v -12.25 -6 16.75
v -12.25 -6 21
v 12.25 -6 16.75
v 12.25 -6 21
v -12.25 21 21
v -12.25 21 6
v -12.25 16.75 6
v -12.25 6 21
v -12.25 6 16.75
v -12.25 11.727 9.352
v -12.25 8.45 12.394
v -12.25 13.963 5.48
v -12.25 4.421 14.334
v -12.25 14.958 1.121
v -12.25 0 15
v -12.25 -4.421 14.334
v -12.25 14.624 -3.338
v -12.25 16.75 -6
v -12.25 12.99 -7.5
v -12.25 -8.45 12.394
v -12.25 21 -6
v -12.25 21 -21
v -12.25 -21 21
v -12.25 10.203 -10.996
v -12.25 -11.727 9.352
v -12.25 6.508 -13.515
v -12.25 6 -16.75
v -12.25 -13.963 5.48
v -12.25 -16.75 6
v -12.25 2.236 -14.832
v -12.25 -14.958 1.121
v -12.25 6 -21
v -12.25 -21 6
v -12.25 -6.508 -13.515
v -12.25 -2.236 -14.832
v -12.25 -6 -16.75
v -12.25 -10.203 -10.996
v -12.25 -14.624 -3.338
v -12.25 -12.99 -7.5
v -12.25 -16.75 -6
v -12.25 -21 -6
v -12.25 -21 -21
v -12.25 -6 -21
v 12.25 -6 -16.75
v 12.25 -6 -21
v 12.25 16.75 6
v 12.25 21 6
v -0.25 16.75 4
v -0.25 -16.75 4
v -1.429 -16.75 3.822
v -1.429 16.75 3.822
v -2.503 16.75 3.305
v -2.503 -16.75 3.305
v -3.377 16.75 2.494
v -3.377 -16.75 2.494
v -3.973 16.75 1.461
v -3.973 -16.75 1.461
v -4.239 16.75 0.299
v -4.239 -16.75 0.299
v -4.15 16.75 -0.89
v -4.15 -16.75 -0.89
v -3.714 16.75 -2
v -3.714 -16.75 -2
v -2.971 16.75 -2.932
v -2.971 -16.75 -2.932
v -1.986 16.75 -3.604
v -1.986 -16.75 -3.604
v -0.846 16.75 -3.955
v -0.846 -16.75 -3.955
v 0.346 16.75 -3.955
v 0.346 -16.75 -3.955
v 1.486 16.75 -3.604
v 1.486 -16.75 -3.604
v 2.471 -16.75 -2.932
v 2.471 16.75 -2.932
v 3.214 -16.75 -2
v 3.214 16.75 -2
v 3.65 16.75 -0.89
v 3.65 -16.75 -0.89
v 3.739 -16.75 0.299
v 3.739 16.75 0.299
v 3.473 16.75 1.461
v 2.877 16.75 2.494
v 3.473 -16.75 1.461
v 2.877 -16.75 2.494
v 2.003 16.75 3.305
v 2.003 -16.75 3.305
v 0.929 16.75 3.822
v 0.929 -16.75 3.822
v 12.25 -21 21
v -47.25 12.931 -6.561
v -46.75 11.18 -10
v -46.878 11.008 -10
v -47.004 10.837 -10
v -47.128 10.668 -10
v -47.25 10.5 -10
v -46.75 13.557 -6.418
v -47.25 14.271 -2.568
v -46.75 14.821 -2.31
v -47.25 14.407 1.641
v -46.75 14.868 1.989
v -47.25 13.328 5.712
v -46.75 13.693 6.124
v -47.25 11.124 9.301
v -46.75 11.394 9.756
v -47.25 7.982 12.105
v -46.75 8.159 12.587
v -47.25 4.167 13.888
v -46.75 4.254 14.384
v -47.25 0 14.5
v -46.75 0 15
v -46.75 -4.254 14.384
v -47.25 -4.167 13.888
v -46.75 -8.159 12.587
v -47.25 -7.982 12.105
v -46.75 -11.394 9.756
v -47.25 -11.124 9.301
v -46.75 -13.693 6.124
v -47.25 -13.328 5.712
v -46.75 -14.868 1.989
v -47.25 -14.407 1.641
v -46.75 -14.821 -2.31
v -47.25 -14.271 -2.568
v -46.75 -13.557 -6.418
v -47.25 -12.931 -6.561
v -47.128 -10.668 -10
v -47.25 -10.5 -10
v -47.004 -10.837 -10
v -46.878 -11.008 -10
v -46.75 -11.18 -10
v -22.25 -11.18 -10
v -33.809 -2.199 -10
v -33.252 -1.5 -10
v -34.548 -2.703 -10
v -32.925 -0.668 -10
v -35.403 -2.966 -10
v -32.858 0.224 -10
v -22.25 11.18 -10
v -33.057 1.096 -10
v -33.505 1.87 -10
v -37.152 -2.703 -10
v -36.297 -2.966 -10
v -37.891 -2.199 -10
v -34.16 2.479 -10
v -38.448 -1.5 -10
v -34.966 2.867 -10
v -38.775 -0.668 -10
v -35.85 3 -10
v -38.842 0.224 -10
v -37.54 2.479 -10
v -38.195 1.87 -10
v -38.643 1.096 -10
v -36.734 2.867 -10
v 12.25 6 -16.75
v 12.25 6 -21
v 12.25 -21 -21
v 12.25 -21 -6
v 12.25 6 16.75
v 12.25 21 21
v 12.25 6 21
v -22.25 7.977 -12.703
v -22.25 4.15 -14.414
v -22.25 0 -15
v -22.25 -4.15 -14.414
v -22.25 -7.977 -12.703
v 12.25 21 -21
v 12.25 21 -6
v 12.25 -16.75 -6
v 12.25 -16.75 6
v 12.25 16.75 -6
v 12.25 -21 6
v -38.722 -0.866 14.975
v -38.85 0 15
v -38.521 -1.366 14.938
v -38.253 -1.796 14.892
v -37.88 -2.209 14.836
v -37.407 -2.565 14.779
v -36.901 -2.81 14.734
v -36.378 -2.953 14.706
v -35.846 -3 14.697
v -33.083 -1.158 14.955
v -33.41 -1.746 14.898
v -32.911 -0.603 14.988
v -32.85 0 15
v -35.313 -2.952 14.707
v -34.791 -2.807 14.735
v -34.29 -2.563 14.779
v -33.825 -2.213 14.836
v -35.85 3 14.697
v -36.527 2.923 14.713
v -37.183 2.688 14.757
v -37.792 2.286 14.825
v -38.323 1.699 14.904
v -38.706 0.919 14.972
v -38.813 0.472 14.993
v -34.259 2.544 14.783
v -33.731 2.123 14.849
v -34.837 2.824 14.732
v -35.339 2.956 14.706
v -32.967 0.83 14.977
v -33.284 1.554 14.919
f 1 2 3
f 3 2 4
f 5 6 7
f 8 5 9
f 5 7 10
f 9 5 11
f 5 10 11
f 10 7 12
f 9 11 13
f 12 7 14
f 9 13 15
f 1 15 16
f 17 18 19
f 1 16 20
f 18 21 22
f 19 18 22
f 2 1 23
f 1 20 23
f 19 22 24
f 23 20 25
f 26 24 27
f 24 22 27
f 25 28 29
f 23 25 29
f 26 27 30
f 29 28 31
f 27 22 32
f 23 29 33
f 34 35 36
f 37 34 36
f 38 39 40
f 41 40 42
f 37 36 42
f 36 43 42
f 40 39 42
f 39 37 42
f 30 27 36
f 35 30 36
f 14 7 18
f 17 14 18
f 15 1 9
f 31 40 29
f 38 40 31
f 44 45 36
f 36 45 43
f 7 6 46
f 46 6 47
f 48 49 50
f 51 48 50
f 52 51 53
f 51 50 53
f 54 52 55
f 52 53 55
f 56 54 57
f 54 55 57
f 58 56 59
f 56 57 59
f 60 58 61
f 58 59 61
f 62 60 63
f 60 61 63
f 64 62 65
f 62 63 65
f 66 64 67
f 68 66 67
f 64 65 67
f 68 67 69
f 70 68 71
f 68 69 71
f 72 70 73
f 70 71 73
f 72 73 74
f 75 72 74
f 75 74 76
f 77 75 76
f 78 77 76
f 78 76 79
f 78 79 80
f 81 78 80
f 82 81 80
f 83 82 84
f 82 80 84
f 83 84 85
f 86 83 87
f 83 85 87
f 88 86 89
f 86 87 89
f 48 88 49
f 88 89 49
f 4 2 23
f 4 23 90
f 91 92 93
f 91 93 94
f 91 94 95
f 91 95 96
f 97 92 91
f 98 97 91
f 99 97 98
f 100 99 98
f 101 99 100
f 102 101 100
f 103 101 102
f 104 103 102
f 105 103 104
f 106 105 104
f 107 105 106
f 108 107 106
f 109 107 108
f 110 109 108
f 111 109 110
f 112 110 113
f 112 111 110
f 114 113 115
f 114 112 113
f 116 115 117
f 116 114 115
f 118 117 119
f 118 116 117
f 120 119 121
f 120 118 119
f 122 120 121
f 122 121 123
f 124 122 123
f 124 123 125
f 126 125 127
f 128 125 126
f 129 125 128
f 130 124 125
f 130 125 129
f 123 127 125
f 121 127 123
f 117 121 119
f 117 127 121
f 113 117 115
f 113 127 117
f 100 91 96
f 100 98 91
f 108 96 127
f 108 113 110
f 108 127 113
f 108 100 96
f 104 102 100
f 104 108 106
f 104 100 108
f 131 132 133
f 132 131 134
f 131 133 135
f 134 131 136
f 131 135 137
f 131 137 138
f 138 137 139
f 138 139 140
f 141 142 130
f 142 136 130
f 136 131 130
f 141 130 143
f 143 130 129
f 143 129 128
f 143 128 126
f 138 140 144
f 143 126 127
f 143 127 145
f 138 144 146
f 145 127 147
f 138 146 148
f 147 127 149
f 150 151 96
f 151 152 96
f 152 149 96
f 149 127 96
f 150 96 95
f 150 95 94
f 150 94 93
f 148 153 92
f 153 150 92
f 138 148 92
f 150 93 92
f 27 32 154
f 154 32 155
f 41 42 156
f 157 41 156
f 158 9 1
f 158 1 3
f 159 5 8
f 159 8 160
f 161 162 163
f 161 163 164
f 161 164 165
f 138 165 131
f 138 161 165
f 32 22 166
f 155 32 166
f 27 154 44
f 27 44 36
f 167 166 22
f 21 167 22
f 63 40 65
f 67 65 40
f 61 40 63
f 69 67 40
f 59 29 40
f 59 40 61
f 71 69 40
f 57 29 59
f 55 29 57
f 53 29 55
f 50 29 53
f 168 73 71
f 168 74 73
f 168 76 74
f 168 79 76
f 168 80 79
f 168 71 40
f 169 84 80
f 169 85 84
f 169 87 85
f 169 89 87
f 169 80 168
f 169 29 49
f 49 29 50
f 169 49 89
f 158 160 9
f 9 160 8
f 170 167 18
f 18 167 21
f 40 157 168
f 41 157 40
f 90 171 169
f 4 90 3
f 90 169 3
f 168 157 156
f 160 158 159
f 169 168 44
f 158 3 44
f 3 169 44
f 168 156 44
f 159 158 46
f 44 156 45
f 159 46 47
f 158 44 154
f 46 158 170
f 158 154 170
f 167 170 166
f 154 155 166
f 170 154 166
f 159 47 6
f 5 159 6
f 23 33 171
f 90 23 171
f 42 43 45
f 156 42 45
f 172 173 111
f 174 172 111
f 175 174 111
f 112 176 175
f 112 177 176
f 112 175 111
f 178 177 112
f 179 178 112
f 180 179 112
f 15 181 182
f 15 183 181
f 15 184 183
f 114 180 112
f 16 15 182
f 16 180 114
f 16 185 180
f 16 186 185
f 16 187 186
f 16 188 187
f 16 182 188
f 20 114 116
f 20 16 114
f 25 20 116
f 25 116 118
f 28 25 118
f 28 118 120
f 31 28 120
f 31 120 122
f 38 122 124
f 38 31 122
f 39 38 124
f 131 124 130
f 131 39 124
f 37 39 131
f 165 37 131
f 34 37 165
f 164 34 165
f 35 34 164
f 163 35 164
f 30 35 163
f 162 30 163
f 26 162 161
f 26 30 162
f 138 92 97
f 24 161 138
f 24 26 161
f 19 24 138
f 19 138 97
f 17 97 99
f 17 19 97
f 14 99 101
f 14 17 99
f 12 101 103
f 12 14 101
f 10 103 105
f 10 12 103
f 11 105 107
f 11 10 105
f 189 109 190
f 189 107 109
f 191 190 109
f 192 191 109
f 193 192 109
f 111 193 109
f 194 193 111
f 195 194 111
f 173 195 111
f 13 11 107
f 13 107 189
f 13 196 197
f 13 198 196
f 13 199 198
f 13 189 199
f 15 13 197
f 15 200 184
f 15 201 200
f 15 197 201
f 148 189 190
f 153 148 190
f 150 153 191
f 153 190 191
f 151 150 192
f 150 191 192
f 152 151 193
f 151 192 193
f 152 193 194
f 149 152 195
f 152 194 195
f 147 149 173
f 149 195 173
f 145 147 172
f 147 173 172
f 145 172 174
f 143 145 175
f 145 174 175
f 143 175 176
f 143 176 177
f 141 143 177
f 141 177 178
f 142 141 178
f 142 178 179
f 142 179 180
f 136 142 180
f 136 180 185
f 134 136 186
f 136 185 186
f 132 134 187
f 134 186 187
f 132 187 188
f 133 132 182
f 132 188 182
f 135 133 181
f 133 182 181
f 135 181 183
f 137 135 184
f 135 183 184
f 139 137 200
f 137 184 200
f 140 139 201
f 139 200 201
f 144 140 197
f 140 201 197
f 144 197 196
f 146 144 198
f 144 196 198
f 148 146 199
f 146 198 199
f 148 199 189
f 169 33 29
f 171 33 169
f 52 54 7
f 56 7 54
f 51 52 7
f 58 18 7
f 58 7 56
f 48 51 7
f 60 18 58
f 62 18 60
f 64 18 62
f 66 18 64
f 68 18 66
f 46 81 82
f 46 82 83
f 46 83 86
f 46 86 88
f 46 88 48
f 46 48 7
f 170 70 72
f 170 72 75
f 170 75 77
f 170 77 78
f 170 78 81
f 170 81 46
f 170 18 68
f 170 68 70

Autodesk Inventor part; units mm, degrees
ref_plane "YZ Plane" through (0, 0, 0) normal (1, 0, 0) x (0, 1, 0)
ref_plane "XZ Plane" through (0, 0, 0) normal (0, 1, 0) x (-1, 0, 0)
ref_plane "XY Plane" through (0, 0, 0) normal (0, 0, 1) x (1, 0, 0)
sketch "Эскиз1" plane through (0, 0, 0) normal (0, 0, 1) x (1, 0, 0)
  line L0 (-12.25, -21) -> (12.25, -21)
  line L1 (12.25, -21) -> (12.25, 21)
  line L2 (12.25, 21) -> (-12.25, 21)
  line L3 (-12.25, 21) -> (-12.25, -21)
  line L4 (-12.25, -21) -> (12.25, 21) construction
  line L5 (12.25, -21) -> (-12.25, 21) construction
  point P0 (0, 0)
  dimension "d0" = 24.5
  dimension "d1" = 42
extrude "Выдавливание1" add sketch "Эскиз1" along normal mid plane 42
sketch "Эскиз2" plane through (-12.25, -21, 21) normal (-1, 0, 0) x (0, 0, 1)
  circle A0 centre (-21, 21) radius 15
  dimension "d4" = 30
extrude "Выдавливание2" add sketch "Эскиз2" along normal blind 35
sketch "Эскиз3" plane through (-47.25, 0, 0) normal (-1, 0, 0) x (0, 0, 1)
  circle A0 centre (0, 0) radius 15 projected
  line L0 (-10, -11.1803) -> (-10, 11.1803)
  dimension "d7" = 25
extrude "Выдавливание3" cut sketch "Эскиз3" against normal blind 25 contours L0 A0 picked at (-11.6306, -0.5993)
chamfer "Фаска1" distance 0.5 angle 45 2 edges at (-47.25, -13.6931, 6.1237) (-47.25, 13.6931, 6.1237)
sketch "Эскиз4" plane through (-12.25, 21, 21) normal (0, 1, 0) x (1, 0, 0)
  line L0 (24.5, 42) -> (24.5, 0) projected
  line L1 (0, 15) -> (24.5, 15)
  line L2 (24.5, 15) -> (24.5, 27)
  line L3 (24.5, 27) -> (0, 27)
  line L4 (0, 27) -> (0, 15)
  line L5 (0, 15) -> (24.5, 27) construction
  line L6 (24.5, 15) -> (0, 27) construction
  point P0 (12.25, 21)
  dimension "d13" = 12
extrude "Выдавливание4" cut sketch "Эскиз4" against normal blind 4.25
sketch "Эскиз5" plane through (-12.25, -21, 21) normal (0, -1, 0) x (1, 0, 0)
  line L0 (24.5, -42) -> (24.5, 0) projected
  line L1 (0, -15) -> (24.5, -15)
  line L2 (24.5, -15) -> (24.5, -27)
  line L3 (24.5, -27) -> (0, -27)
  line L4 (0, -27) -> (0, -15)
  line L5 (0, -15) -> (24.5, -27) construction
  line L6 (24.5, -15) -> (0, -27) construction
  point P0 (12.25, -21)
  dimension "d16" = 12
extrude "Выдавливание5" cut sketch "Эскиз5" against normal blind 4.25
sketch "Эскиз6" plane through (0, 0, -21) normal (0, 0, -1) x (-1, 0, 0)
  line L0 (-12.25, -21) -> (-12.25, 21) projected
  line L1 (12.25, 6) -> (-12.25, 6)
  line L2 (-12.25, 6) -> (-12.25, -6)
  line L3 (-12.25, -6) -> (12.25, -6)
  line L4 (12.25, -6) -> (12.25, 6)
  line L5 (12.25, 6) -> (-12.25, -6) construction
  line L6 (-12.25, 6) -> (12.25, -6) construction
  point P0 (0, 0)
  dimension "d19" = 12
extrude "Выдавливание6" cut sketch "Эскиз6" against normal blind 4.25
sketch "Эскиз7" plane through (0, 0, 21) normal (0, 0, 1) x (1, 0, 0)
  line L0 (-12.25, 6) -> (-12.25, -6) projected
  line L1 (12.25, 6) -> (-12.25, 6)
  line L2 (-12.25, 6) -> (-12.25, -6)
  line L3 (-12.25, -6) -> (12.25, -6)
  line L4 (12.25, -6) -> (12.25, 6)
  line L5 (12.25, 6) -> (-12.25, -6) construction
  line L6 (-12.25, 6) -> (12.25, -6) construction
  point P0 (0, 0)
  dimension "d22" = 12
extrude "Выдавливание7" cut sketch "Эскиз7" against normal blind 4.25
sketch "Эскиз8" plane through (-22.25, -11.1803, -10) normal (0, 0, -1) x (-1, 0, 0)
  line L0 (25, 21.6803) -> (25, 0.6803) projected
  point P0 (-22.25, 11.1803)
  point P1 (13.6, 11.1803)
  dimension "d25" = 11.4
hole "Отверстие1" at (-35.85, 0, -10) direction (0, 0, 1) diameter 6 end through all
sketch "Эскиз9" plane through (-12.25, 16.75, 21) normal (0, 1, 0) x (1, 0, 0)
  line L0 (24.5, 27) -> (24.5, 15) projected
  point P0 (12.25, 21)
  point P1 (12, 21)
  dimension "d33" = 12.5
hole "Отверстие2" at (-0.25, 16.75, 0) direction (0, -1, 0) diameter 8 end through all
